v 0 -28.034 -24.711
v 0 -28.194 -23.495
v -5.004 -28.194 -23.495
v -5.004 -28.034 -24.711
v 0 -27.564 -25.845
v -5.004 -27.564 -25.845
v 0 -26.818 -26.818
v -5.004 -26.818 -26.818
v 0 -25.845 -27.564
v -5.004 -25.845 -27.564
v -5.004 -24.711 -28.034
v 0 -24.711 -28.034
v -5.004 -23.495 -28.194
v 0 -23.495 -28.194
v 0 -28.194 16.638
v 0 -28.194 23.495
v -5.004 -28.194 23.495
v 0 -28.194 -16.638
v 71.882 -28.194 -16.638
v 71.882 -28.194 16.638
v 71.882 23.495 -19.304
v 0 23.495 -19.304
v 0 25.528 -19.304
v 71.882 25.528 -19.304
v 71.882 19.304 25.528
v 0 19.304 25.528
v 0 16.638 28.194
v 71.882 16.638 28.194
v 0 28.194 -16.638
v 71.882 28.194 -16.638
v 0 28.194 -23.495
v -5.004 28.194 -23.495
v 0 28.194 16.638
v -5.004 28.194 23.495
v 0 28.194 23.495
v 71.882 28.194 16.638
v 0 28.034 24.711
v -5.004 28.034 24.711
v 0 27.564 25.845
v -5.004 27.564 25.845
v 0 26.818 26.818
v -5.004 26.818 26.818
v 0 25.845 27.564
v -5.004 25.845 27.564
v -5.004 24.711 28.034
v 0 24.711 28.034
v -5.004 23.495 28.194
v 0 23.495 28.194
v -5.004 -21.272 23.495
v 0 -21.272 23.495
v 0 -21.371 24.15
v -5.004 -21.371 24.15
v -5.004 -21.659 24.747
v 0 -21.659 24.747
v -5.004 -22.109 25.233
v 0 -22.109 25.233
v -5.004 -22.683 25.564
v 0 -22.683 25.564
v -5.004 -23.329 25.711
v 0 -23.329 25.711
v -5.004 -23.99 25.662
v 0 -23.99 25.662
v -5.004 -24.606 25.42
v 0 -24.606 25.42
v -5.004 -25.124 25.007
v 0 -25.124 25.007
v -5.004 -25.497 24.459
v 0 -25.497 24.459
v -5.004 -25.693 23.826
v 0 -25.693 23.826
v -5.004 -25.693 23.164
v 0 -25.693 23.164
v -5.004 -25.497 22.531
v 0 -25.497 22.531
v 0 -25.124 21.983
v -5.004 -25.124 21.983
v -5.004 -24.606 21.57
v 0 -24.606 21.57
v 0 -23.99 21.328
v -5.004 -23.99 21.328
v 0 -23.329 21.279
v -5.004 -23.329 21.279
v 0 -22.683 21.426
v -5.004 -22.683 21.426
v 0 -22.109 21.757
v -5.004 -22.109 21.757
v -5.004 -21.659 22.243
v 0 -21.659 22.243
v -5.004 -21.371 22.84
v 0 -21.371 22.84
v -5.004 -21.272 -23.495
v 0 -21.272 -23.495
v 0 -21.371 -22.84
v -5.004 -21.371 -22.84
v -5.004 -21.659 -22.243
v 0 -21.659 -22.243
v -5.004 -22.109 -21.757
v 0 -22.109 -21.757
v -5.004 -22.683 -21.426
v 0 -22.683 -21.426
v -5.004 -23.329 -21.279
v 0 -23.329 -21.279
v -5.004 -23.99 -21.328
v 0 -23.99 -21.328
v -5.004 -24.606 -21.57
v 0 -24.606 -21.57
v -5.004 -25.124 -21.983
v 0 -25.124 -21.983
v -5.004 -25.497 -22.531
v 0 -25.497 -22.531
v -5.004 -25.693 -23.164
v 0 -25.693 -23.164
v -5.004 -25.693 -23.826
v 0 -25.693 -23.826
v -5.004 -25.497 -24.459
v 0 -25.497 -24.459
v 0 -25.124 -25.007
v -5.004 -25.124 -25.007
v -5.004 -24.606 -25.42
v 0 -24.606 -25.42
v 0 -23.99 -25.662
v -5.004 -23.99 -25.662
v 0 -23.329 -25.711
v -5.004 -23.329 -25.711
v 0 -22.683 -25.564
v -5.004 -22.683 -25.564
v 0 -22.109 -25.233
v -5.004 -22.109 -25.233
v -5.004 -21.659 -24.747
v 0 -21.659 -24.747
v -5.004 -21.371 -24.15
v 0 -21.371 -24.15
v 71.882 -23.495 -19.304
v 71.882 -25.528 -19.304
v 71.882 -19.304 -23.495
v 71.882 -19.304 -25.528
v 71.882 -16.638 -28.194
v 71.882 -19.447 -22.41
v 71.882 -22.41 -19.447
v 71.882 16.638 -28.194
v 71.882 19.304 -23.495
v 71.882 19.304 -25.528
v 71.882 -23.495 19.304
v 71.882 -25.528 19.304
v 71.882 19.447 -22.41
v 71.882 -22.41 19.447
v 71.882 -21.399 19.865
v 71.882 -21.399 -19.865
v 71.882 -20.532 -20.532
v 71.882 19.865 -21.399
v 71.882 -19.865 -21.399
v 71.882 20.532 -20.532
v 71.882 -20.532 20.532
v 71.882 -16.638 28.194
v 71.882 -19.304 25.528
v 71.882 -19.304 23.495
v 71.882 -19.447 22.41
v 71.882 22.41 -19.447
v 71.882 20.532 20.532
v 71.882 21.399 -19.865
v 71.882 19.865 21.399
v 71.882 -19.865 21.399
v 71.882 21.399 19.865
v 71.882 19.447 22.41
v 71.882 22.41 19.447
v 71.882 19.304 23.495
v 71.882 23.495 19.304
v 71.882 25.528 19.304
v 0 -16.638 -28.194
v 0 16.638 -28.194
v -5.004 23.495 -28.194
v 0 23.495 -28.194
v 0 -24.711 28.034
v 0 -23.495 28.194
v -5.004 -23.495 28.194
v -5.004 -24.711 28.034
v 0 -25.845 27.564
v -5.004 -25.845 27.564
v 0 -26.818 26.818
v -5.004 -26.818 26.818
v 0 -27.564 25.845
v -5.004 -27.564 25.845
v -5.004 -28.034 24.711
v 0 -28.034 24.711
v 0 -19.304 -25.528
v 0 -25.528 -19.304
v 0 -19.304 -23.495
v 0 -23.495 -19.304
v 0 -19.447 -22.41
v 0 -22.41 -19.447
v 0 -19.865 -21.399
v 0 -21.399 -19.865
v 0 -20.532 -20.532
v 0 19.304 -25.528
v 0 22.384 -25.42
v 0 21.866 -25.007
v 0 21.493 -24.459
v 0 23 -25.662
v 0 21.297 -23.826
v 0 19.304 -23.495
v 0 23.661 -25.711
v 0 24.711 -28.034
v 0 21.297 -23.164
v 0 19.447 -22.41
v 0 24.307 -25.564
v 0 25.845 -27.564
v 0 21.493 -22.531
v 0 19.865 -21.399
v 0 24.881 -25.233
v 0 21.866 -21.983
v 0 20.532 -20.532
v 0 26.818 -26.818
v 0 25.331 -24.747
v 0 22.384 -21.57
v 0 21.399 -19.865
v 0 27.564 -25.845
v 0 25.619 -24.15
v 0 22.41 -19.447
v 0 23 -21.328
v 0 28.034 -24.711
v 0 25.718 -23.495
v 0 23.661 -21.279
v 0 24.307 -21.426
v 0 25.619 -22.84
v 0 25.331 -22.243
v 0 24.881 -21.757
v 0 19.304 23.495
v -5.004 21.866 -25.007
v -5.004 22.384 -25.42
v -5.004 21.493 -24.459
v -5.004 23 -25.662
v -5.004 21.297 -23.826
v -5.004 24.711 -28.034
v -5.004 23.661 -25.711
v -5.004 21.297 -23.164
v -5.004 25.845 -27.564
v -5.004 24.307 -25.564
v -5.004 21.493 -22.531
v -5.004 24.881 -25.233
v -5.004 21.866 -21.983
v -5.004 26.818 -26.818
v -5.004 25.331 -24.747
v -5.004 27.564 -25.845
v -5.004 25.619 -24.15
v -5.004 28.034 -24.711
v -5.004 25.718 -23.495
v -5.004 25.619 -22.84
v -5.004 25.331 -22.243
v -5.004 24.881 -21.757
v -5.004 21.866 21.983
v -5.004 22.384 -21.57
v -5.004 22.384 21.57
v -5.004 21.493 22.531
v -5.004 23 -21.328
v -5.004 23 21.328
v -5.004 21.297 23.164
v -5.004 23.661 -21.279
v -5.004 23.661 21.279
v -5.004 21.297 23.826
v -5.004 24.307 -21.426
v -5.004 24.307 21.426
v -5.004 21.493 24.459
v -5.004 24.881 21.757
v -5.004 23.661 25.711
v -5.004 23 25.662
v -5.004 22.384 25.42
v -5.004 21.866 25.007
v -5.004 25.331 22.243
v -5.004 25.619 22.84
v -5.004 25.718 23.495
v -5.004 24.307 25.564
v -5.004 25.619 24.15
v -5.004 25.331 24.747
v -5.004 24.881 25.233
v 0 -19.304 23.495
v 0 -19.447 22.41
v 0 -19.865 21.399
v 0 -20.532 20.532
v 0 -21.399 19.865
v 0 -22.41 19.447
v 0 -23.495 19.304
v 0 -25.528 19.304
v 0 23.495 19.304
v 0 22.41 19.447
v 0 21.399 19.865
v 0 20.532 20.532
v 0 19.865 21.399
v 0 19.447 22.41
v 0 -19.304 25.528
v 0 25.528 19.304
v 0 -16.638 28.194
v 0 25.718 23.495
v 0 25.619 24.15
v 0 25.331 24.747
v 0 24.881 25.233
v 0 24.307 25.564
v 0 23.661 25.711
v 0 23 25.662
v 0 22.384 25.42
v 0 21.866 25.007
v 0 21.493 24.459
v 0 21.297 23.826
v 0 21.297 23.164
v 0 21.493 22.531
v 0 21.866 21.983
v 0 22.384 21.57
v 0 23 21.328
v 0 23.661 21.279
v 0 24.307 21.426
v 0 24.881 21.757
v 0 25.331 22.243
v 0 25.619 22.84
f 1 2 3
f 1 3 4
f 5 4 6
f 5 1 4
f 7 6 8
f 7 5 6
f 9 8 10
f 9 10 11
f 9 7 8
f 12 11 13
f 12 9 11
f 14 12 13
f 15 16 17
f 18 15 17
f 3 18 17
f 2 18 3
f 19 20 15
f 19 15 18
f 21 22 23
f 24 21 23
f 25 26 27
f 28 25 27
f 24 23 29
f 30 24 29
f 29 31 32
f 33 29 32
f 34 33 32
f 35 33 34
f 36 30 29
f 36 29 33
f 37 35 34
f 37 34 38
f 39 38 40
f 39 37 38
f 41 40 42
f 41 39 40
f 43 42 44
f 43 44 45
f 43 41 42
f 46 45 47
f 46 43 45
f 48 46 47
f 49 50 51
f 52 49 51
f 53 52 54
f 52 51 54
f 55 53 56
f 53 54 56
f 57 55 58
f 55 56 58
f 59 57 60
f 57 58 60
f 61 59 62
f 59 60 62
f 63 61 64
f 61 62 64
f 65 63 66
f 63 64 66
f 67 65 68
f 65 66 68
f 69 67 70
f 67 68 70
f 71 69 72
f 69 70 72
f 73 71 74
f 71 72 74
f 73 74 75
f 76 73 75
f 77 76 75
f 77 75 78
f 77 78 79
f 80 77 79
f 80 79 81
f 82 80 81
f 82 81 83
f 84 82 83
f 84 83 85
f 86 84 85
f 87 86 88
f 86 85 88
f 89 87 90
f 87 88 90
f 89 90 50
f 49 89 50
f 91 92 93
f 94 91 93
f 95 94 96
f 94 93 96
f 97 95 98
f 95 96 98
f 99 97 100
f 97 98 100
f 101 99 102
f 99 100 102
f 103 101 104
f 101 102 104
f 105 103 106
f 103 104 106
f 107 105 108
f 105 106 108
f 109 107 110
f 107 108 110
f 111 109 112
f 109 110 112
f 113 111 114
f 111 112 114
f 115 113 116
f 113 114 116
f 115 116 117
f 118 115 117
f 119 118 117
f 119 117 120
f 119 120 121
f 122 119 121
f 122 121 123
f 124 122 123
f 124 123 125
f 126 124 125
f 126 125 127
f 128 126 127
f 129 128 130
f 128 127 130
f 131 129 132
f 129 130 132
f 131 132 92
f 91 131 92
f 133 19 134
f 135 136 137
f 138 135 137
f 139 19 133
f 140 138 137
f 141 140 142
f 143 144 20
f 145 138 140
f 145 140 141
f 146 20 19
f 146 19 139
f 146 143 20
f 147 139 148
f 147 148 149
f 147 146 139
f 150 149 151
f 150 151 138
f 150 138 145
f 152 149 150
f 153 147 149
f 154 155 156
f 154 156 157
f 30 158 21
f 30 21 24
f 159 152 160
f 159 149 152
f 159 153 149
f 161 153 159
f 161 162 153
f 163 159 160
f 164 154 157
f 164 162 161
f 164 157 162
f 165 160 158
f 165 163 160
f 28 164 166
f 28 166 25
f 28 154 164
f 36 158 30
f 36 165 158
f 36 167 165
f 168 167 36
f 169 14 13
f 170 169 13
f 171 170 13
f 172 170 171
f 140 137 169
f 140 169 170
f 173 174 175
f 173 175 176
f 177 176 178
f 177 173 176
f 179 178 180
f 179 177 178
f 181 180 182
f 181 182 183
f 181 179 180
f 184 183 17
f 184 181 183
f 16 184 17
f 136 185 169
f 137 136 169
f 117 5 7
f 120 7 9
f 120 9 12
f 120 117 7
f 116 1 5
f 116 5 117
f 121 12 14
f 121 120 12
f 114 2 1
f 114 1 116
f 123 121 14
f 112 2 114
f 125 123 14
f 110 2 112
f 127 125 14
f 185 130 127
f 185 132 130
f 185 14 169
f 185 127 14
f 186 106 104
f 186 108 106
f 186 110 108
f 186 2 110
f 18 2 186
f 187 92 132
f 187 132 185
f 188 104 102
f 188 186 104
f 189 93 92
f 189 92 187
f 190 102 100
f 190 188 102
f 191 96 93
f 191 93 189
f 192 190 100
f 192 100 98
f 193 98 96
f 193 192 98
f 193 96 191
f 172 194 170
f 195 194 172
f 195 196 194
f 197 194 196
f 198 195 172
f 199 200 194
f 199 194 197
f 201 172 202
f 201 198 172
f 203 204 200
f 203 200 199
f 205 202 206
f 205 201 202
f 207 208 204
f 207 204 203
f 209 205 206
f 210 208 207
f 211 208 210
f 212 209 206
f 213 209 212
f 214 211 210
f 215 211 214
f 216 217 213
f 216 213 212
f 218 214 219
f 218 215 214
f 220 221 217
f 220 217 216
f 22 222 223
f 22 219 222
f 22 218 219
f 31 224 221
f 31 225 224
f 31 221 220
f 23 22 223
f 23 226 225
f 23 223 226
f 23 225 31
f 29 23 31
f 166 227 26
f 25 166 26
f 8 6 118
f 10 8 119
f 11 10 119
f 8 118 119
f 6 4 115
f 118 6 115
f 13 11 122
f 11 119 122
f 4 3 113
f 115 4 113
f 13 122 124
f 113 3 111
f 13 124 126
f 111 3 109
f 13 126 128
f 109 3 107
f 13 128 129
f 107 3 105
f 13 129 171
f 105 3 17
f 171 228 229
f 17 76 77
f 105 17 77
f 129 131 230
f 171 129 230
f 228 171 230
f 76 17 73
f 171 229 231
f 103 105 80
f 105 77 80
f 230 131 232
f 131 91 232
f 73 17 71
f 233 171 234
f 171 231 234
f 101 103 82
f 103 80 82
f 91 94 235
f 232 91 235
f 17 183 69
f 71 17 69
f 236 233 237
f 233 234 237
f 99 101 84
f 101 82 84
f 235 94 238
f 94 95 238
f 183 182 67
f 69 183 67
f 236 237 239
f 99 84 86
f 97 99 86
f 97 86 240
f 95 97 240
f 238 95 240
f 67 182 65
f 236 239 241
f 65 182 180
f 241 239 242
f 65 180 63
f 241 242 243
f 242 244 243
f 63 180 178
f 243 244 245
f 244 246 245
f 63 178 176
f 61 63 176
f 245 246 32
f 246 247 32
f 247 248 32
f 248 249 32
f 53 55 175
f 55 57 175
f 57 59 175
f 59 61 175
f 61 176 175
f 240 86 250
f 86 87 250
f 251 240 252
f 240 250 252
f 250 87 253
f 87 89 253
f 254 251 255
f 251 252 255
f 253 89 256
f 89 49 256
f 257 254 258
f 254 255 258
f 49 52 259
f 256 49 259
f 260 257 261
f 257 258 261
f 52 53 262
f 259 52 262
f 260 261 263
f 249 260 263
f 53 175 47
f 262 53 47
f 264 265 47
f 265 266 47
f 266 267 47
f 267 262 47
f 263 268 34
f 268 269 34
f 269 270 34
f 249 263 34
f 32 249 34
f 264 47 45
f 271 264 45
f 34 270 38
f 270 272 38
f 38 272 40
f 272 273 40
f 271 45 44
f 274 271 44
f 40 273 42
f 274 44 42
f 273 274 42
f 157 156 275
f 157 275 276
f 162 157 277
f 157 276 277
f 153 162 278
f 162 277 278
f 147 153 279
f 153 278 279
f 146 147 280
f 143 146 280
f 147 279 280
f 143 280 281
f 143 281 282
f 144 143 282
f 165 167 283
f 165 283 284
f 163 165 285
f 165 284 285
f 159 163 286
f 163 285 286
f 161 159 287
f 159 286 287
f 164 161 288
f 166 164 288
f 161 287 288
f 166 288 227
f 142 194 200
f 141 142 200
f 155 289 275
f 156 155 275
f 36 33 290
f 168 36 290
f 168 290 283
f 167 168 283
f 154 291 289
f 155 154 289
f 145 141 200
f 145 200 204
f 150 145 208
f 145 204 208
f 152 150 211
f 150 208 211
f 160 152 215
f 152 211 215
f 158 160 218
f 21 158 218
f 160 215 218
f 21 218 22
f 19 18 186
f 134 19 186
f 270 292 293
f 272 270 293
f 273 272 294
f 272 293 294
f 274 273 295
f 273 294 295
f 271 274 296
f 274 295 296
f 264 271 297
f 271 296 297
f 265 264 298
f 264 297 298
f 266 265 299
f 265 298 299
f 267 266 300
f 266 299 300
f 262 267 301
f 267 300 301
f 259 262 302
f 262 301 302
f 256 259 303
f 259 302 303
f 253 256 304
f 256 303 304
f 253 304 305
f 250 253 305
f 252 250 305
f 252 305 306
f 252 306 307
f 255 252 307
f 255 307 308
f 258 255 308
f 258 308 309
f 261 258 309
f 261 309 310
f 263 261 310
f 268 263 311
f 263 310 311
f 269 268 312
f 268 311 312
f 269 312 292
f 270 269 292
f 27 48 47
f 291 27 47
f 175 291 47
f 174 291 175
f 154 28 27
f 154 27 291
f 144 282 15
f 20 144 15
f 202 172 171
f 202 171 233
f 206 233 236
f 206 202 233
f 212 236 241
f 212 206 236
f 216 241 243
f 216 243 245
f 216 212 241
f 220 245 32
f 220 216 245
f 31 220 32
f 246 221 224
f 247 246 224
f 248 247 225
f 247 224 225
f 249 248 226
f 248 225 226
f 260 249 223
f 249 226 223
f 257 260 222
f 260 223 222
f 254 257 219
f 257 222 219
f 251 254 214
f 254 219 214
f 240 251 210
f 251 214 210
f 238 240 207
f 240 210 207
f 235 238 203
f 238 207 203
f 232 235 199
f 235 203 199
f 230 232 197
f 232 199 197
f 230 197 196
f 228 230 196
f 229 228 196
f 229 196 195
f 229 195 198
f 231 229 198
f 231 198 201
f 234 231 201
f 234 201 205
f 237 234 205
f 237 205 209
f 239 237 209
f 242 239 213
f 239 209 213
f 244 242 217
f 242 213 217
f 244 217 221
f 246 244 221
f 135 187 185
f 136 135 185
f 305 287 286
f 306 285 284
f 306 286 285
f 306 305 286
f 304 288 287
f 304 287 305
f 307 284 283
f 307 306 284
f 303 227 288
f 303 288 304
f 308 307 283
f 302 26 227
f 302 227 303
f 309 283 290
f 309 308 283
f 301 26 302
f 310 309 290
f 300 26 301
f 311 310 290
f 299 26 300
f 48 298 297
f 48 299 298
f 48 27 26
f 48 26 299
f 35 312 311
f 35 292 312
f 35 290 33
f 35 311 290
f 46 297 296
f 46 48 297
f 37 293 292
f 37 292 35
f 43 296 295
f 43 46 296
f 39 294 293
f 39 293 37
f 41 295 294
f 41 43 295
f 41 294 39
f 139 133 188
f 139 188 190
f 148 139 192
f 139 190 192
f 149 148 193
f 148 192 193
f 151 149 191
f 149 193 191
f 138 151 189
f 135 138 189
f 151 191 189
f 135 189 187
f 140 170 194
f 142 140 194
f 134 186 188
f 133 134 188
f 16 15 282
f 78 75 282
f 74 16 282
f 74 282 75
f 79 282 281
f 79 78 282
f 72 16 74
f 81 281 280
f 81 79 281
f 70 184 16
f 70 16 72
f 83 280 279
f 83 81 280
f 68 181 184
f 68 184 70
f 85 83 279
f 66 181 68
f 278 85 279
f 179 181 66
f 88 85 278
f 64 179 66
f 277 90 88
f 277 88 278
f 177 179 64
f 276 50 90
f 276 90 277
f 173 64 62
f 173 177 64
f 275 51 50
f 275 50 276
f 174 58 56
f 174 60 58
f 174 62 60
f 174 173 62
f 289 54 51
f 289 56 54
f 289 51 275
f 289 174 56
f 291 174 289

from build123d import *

# Parameters (mm, degrees)
F1_DEPTH = 71.882
F0_R     = 2.2225
F2_DEPTH = 5.0038


with BuildPart() as f1:
    # F0 (on Right) → F1 (new body)
    with BuildSketch(Plane.YZ):
        with BuildLine():
            Line((-23.495, 19.304), (-25.528179, 19.304))
            Line((-25.528179, 19.304), (-28.194, 16.638179))
            Line((-28.194, 16.638179), (-28.194, -16.638179))
            Line((-28.194, -16.638179), (-25.528179, -19.304))
            Line((-25.528179, -19.304), (-23.495, -19.304))
            ThreePointArc((-23.495, -19.304), (-20.531515, -20.531515), (-19.304, -23.495))
            Line((-19.304, -23.495), (-19.304, -25.528179))
            Line((-19.304, -25.528179), (-16.638179, -28.194))
            Line((-16.638179, -28.194), (16.638179, -28.194))
            Line((16.638179, -28.194), (19.304, -25.528179))
            Line((19.304, -25.528179), (19.304, -23.495))
            ThreePointArc((19.304, -23.495), (20.531515, -20.531515), (23.495, -19.304))
            Line((23.495, -19.304), (25.528179, -19.304))
            Line((25.528179, -19.304), (28.194, -16.638179))
            Line((28.194, -16.638179), (28.194, 16.638179))
            Line((28.194, 16.638179), (25.528179, 19.304))
            Line((25.528179, 19.304), (23.495, 19.304))
            ThreePointArc((23.495, 19.304), (20.531515, 20.531515), (19.304, 23.495))
            Line((19.304, 23.495), (19.304, 25.528179))
            Line((19.304, 25.528179), (16.638179, 28.194))
            Line((16.638179, 28.194), (-16.638179, 28.194))
            Line((-16.638179, 28.194), (-19.304, 25.528179))
            Line((-19.304, 25.528179), (-19.304, 23.495))
            ThreePointArc((-19.304, 23.495), (-20.531515, 20.531515), (-23.495, 19.304))
        make_face()
    extrude(amount=F1_DEPTH)

    # F0 (on Right) → F2 (join)
    with BuildSketch(Plane.YZ):
        with BuildLine():
            Line((-28.194, 16.638179), (-25.528179, 19.304))
            Line((-25.528179, 19.304), (-23.495, 19.304))
            ThreePointArc((-23.495, 19.304), (-20.531515, 20.531515), (-19.304, 23.495))
            Line((-19.304, 23.495), (-19.304, 25.528179))
            Line((-19.304, 25.528179), (-16.638179, 28.194))
            Line((-16.638179, 28.194), (-23.495, 28.194))
            ThreePointArc((-23.495, 28.194), (-26.817695, 26.817695), (-28.194, 23.495))
            Line((-28.194, 23.495), (-28.194, 16.638179))
        make_face()
        with Locations((-23.495, 23.495)):
            Circle(F0_R, mode=Mode.SUBTRACT)
        with BuildLine():
            Line((-23.495, 19.304), (-25.528179, 19.304))
            Line((-25.528179, 19.304), (-28.194, 16.638179))
            Line((-28.194, 16.638179), (-28.194, -16.638179))
            Line((-28.194, -16.638179), (-25.528179, -19.304))
            Line((-25.528179, -19.304), (-23.495, -19.304))
            ThreePointArc((-23.495, -19.304), (-20.531515, -20.531515), (-19.304, -23.495))
            Line((-19.304, -23.495), (-19.304, -25.528179))
            Line((-19.304, -25.528179), (-16.638179, -28.194))
            Line((-16.638179, -28.194), (16.638179, -28.194))
            Line((16.638179, -28.194), (19.304, -25.528179))
            Line((19.304, -25.528179), (19.304, -23.495))
            ThreePointArc((19.304, -23.495), (20.531515, -20.531515), (23.495, -19.304))
            Line((23.495, -19.304), (25.528179, -19.304))
            Line((25.528179, -19.304), (28.194, -16.638179))
            Line((28.194, -16.638179), (28.194, 16.638179))
            Line((28.194, 16.638179), (25.528179, 19.304))
            Line((25.528179, 19.304), (23.495, 19.304))
            ThreePointArc((23.495, 19.304), (20.531515, 20.531515), (19.304, 23.495))
            Line((19.304, 23.495), (19.304, 25.528179))
            Line((19.304, 25.528179), (16.638179, 28.194))
            Line((16.638179, 28.194), (-16.638179, 28.194))
            Line((-16.638179, 28.194), (-19.304, 25.528179))
            Line((-19.304, 25.528179), (-19.304, 23.495))
            ThreePointArc((-19.304, 23.495), (-20.531515, 20.531515), (-23.495, 19.304))
        make_face()
        with BuildLine():
            Line((-25.528179, -19.304), (-28.194, -16.638179))
            Line((-28.194, -16.638179), (-28.194, -23.495))
            ThreePointArc((-28.194, -23.495), (-26.817695, -26.817695), (-23.495, -28.194))
            Line((-23.495, -28.194), (-16.638179, -28.194))
            Line((-16.638179, -28.194), (-19.304, -25.528179))
            Line((-19.304, -25.528179), (-19.304, -23.495))
            ThreePointArc((-19.304, -23.495), (-20.531515, -20.531515), (-23.495, -19.304))
            Line((-23.495, -19.304), (-25.528179, -19.304))
        make_face()
        with Locations((-23.495, -23.495)):
            Circle(F0_R, mode=Mode.SUBTRACT)
        with BuildLine():
            Line((23.495, 28.194), (16.638179, 28.194))
            Line((16.638179, 28.194), (19.304, 25.528179))
            Line((19.304, 25.528179), (19.304, 23.495))
            ThreePointArc((19.304, 23.495), (20.531515, 20.531515), (23.495, 19.304))
            Line((23.495, 19.304), (25.528179, 19.304))
            Line((25.528179, 19.304), (28.194, 16.638179))
            Line((28.194, 16.638179), (28.194, 23.495))
            ThreePointArc((28.194, 23.495), (26.817695, 26.817695), (23.495, 28.194))
        make_face()
        with Locations((23.495, 23.495)):
            Circle(F0_R, mode=Mode.SUBTRACT)
        with BuildLine():
            Line((19.304, -25.528179), (16.638179, -28.194))
            Line((16.638179, -28.194), (23.495, -28.194))
            ThreePointArc((23.495, -28.194), (26.817695, -26.817695), (28.194, -23.495))
            Line((28.194, -23.495), (28.194, -16.638179))
            Line((28.194, -16.638179), (25.528179, -19.304))
            Line((25.528179, -19.304), (23.495, -19.304))
            ThreePointArc((23.495, -19.304), (20.531515, -20.531515), (19.304, -23.495))
            Line((19.304, -23.495), (19.304, -25.528179))
        make_face()
        with Locations((23.495, -23.495)):
            Circle(F0_R, mode=Mode.SUBTRACT)
    extrude(amount=-F2_DEPTH)


solid = f1.part
